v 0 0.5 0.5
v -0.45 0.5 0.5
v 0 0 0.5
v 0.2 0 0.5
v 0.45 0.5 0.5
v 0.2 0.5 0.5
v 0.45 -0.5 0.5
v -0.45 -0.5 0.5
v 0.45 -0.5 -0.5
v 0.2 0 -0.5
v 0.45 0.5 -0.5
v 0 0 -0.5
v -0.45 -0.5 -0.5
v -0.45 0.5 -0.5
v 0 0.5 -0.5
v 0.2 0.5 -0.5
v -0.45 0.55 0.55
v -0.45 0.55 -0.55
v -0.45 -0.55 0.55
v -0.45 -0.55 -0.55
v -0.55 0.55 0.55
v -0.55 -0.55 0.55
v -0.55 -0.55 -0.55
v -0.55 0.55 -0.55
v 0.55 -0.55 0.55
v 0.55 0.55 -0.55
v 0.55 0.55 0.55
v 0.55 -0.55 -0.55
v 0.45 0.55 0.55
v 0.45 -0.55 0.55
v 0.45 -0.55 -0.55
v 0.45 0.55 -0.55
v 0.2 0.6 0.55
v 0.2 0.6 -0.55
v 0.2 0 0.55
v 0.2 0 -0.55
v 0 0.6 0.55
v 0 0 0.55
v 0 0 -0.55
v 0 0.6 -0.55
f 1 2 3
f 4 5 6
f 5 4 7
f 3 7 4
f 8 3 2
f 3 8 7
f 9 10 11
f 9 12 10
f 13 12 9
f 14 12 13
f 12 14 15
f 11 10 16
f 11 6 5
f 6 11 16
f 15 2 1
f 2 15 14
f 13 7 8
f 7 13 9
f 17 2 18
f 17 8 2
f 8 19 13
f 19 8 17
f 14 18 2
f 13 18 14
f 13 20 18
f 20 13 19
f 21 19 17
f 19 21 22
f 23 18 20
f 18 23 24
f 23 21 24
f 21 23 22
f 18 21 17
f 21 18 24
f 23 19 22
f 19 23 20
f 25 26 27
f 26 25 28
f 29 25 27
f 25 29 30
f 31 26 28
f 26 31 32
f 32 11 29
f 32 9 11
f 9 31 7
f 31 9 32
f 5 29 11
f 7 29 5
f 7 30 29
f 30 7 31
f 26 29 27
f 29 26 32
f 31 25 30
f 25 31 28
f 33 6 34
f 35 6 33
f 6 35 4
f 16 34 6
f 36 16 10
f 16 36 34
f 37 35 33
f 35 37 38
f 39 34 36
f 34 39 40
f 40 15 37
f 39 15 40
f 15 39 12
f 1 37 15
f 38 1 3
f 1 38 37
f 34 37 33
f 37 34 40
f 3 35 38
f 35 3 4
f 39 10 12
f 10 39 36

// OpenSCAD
include <../openscad2calculix.scad>

os2cx_mesh("cube") {
    cube([1.0, 1.0, 1.0], center=true);
}

os2cx_select_surface("anchored_end", [-1, 0, 0], 45) {
    translate([-0.5, 0.0, 0.0])
        cube([0.1, 1.1, 1.1], center=true);
}

os2cx_select_surface("loaded_end", [1, 0, 0], 45) {
    translate([0.5, 0.0, 0.0])
        cube([0.1, 1.1, 1.1], center=true);
}

os2cx_slice("cut", [1, 0, 0], 45) {
    translate([0.1, 0.3, 0.0])
        cube([0.2, 0.6, 1.1], center=true);
}

os2cx_load_surface(
    "load",
    "loaded_end",
    force_total=[[0, 0, -1000], "kN"]);

os2cx_material_elastic_simple(
    "steel",
    youngs_modulus=[209, "GPa"],
    poissons_ratio=0.3);

os2cx_analysis_static_simple(
    mesh="cube",
    material="steel",
    fixed="anchored_end",
    load="load",
    length_unit="m"
);
